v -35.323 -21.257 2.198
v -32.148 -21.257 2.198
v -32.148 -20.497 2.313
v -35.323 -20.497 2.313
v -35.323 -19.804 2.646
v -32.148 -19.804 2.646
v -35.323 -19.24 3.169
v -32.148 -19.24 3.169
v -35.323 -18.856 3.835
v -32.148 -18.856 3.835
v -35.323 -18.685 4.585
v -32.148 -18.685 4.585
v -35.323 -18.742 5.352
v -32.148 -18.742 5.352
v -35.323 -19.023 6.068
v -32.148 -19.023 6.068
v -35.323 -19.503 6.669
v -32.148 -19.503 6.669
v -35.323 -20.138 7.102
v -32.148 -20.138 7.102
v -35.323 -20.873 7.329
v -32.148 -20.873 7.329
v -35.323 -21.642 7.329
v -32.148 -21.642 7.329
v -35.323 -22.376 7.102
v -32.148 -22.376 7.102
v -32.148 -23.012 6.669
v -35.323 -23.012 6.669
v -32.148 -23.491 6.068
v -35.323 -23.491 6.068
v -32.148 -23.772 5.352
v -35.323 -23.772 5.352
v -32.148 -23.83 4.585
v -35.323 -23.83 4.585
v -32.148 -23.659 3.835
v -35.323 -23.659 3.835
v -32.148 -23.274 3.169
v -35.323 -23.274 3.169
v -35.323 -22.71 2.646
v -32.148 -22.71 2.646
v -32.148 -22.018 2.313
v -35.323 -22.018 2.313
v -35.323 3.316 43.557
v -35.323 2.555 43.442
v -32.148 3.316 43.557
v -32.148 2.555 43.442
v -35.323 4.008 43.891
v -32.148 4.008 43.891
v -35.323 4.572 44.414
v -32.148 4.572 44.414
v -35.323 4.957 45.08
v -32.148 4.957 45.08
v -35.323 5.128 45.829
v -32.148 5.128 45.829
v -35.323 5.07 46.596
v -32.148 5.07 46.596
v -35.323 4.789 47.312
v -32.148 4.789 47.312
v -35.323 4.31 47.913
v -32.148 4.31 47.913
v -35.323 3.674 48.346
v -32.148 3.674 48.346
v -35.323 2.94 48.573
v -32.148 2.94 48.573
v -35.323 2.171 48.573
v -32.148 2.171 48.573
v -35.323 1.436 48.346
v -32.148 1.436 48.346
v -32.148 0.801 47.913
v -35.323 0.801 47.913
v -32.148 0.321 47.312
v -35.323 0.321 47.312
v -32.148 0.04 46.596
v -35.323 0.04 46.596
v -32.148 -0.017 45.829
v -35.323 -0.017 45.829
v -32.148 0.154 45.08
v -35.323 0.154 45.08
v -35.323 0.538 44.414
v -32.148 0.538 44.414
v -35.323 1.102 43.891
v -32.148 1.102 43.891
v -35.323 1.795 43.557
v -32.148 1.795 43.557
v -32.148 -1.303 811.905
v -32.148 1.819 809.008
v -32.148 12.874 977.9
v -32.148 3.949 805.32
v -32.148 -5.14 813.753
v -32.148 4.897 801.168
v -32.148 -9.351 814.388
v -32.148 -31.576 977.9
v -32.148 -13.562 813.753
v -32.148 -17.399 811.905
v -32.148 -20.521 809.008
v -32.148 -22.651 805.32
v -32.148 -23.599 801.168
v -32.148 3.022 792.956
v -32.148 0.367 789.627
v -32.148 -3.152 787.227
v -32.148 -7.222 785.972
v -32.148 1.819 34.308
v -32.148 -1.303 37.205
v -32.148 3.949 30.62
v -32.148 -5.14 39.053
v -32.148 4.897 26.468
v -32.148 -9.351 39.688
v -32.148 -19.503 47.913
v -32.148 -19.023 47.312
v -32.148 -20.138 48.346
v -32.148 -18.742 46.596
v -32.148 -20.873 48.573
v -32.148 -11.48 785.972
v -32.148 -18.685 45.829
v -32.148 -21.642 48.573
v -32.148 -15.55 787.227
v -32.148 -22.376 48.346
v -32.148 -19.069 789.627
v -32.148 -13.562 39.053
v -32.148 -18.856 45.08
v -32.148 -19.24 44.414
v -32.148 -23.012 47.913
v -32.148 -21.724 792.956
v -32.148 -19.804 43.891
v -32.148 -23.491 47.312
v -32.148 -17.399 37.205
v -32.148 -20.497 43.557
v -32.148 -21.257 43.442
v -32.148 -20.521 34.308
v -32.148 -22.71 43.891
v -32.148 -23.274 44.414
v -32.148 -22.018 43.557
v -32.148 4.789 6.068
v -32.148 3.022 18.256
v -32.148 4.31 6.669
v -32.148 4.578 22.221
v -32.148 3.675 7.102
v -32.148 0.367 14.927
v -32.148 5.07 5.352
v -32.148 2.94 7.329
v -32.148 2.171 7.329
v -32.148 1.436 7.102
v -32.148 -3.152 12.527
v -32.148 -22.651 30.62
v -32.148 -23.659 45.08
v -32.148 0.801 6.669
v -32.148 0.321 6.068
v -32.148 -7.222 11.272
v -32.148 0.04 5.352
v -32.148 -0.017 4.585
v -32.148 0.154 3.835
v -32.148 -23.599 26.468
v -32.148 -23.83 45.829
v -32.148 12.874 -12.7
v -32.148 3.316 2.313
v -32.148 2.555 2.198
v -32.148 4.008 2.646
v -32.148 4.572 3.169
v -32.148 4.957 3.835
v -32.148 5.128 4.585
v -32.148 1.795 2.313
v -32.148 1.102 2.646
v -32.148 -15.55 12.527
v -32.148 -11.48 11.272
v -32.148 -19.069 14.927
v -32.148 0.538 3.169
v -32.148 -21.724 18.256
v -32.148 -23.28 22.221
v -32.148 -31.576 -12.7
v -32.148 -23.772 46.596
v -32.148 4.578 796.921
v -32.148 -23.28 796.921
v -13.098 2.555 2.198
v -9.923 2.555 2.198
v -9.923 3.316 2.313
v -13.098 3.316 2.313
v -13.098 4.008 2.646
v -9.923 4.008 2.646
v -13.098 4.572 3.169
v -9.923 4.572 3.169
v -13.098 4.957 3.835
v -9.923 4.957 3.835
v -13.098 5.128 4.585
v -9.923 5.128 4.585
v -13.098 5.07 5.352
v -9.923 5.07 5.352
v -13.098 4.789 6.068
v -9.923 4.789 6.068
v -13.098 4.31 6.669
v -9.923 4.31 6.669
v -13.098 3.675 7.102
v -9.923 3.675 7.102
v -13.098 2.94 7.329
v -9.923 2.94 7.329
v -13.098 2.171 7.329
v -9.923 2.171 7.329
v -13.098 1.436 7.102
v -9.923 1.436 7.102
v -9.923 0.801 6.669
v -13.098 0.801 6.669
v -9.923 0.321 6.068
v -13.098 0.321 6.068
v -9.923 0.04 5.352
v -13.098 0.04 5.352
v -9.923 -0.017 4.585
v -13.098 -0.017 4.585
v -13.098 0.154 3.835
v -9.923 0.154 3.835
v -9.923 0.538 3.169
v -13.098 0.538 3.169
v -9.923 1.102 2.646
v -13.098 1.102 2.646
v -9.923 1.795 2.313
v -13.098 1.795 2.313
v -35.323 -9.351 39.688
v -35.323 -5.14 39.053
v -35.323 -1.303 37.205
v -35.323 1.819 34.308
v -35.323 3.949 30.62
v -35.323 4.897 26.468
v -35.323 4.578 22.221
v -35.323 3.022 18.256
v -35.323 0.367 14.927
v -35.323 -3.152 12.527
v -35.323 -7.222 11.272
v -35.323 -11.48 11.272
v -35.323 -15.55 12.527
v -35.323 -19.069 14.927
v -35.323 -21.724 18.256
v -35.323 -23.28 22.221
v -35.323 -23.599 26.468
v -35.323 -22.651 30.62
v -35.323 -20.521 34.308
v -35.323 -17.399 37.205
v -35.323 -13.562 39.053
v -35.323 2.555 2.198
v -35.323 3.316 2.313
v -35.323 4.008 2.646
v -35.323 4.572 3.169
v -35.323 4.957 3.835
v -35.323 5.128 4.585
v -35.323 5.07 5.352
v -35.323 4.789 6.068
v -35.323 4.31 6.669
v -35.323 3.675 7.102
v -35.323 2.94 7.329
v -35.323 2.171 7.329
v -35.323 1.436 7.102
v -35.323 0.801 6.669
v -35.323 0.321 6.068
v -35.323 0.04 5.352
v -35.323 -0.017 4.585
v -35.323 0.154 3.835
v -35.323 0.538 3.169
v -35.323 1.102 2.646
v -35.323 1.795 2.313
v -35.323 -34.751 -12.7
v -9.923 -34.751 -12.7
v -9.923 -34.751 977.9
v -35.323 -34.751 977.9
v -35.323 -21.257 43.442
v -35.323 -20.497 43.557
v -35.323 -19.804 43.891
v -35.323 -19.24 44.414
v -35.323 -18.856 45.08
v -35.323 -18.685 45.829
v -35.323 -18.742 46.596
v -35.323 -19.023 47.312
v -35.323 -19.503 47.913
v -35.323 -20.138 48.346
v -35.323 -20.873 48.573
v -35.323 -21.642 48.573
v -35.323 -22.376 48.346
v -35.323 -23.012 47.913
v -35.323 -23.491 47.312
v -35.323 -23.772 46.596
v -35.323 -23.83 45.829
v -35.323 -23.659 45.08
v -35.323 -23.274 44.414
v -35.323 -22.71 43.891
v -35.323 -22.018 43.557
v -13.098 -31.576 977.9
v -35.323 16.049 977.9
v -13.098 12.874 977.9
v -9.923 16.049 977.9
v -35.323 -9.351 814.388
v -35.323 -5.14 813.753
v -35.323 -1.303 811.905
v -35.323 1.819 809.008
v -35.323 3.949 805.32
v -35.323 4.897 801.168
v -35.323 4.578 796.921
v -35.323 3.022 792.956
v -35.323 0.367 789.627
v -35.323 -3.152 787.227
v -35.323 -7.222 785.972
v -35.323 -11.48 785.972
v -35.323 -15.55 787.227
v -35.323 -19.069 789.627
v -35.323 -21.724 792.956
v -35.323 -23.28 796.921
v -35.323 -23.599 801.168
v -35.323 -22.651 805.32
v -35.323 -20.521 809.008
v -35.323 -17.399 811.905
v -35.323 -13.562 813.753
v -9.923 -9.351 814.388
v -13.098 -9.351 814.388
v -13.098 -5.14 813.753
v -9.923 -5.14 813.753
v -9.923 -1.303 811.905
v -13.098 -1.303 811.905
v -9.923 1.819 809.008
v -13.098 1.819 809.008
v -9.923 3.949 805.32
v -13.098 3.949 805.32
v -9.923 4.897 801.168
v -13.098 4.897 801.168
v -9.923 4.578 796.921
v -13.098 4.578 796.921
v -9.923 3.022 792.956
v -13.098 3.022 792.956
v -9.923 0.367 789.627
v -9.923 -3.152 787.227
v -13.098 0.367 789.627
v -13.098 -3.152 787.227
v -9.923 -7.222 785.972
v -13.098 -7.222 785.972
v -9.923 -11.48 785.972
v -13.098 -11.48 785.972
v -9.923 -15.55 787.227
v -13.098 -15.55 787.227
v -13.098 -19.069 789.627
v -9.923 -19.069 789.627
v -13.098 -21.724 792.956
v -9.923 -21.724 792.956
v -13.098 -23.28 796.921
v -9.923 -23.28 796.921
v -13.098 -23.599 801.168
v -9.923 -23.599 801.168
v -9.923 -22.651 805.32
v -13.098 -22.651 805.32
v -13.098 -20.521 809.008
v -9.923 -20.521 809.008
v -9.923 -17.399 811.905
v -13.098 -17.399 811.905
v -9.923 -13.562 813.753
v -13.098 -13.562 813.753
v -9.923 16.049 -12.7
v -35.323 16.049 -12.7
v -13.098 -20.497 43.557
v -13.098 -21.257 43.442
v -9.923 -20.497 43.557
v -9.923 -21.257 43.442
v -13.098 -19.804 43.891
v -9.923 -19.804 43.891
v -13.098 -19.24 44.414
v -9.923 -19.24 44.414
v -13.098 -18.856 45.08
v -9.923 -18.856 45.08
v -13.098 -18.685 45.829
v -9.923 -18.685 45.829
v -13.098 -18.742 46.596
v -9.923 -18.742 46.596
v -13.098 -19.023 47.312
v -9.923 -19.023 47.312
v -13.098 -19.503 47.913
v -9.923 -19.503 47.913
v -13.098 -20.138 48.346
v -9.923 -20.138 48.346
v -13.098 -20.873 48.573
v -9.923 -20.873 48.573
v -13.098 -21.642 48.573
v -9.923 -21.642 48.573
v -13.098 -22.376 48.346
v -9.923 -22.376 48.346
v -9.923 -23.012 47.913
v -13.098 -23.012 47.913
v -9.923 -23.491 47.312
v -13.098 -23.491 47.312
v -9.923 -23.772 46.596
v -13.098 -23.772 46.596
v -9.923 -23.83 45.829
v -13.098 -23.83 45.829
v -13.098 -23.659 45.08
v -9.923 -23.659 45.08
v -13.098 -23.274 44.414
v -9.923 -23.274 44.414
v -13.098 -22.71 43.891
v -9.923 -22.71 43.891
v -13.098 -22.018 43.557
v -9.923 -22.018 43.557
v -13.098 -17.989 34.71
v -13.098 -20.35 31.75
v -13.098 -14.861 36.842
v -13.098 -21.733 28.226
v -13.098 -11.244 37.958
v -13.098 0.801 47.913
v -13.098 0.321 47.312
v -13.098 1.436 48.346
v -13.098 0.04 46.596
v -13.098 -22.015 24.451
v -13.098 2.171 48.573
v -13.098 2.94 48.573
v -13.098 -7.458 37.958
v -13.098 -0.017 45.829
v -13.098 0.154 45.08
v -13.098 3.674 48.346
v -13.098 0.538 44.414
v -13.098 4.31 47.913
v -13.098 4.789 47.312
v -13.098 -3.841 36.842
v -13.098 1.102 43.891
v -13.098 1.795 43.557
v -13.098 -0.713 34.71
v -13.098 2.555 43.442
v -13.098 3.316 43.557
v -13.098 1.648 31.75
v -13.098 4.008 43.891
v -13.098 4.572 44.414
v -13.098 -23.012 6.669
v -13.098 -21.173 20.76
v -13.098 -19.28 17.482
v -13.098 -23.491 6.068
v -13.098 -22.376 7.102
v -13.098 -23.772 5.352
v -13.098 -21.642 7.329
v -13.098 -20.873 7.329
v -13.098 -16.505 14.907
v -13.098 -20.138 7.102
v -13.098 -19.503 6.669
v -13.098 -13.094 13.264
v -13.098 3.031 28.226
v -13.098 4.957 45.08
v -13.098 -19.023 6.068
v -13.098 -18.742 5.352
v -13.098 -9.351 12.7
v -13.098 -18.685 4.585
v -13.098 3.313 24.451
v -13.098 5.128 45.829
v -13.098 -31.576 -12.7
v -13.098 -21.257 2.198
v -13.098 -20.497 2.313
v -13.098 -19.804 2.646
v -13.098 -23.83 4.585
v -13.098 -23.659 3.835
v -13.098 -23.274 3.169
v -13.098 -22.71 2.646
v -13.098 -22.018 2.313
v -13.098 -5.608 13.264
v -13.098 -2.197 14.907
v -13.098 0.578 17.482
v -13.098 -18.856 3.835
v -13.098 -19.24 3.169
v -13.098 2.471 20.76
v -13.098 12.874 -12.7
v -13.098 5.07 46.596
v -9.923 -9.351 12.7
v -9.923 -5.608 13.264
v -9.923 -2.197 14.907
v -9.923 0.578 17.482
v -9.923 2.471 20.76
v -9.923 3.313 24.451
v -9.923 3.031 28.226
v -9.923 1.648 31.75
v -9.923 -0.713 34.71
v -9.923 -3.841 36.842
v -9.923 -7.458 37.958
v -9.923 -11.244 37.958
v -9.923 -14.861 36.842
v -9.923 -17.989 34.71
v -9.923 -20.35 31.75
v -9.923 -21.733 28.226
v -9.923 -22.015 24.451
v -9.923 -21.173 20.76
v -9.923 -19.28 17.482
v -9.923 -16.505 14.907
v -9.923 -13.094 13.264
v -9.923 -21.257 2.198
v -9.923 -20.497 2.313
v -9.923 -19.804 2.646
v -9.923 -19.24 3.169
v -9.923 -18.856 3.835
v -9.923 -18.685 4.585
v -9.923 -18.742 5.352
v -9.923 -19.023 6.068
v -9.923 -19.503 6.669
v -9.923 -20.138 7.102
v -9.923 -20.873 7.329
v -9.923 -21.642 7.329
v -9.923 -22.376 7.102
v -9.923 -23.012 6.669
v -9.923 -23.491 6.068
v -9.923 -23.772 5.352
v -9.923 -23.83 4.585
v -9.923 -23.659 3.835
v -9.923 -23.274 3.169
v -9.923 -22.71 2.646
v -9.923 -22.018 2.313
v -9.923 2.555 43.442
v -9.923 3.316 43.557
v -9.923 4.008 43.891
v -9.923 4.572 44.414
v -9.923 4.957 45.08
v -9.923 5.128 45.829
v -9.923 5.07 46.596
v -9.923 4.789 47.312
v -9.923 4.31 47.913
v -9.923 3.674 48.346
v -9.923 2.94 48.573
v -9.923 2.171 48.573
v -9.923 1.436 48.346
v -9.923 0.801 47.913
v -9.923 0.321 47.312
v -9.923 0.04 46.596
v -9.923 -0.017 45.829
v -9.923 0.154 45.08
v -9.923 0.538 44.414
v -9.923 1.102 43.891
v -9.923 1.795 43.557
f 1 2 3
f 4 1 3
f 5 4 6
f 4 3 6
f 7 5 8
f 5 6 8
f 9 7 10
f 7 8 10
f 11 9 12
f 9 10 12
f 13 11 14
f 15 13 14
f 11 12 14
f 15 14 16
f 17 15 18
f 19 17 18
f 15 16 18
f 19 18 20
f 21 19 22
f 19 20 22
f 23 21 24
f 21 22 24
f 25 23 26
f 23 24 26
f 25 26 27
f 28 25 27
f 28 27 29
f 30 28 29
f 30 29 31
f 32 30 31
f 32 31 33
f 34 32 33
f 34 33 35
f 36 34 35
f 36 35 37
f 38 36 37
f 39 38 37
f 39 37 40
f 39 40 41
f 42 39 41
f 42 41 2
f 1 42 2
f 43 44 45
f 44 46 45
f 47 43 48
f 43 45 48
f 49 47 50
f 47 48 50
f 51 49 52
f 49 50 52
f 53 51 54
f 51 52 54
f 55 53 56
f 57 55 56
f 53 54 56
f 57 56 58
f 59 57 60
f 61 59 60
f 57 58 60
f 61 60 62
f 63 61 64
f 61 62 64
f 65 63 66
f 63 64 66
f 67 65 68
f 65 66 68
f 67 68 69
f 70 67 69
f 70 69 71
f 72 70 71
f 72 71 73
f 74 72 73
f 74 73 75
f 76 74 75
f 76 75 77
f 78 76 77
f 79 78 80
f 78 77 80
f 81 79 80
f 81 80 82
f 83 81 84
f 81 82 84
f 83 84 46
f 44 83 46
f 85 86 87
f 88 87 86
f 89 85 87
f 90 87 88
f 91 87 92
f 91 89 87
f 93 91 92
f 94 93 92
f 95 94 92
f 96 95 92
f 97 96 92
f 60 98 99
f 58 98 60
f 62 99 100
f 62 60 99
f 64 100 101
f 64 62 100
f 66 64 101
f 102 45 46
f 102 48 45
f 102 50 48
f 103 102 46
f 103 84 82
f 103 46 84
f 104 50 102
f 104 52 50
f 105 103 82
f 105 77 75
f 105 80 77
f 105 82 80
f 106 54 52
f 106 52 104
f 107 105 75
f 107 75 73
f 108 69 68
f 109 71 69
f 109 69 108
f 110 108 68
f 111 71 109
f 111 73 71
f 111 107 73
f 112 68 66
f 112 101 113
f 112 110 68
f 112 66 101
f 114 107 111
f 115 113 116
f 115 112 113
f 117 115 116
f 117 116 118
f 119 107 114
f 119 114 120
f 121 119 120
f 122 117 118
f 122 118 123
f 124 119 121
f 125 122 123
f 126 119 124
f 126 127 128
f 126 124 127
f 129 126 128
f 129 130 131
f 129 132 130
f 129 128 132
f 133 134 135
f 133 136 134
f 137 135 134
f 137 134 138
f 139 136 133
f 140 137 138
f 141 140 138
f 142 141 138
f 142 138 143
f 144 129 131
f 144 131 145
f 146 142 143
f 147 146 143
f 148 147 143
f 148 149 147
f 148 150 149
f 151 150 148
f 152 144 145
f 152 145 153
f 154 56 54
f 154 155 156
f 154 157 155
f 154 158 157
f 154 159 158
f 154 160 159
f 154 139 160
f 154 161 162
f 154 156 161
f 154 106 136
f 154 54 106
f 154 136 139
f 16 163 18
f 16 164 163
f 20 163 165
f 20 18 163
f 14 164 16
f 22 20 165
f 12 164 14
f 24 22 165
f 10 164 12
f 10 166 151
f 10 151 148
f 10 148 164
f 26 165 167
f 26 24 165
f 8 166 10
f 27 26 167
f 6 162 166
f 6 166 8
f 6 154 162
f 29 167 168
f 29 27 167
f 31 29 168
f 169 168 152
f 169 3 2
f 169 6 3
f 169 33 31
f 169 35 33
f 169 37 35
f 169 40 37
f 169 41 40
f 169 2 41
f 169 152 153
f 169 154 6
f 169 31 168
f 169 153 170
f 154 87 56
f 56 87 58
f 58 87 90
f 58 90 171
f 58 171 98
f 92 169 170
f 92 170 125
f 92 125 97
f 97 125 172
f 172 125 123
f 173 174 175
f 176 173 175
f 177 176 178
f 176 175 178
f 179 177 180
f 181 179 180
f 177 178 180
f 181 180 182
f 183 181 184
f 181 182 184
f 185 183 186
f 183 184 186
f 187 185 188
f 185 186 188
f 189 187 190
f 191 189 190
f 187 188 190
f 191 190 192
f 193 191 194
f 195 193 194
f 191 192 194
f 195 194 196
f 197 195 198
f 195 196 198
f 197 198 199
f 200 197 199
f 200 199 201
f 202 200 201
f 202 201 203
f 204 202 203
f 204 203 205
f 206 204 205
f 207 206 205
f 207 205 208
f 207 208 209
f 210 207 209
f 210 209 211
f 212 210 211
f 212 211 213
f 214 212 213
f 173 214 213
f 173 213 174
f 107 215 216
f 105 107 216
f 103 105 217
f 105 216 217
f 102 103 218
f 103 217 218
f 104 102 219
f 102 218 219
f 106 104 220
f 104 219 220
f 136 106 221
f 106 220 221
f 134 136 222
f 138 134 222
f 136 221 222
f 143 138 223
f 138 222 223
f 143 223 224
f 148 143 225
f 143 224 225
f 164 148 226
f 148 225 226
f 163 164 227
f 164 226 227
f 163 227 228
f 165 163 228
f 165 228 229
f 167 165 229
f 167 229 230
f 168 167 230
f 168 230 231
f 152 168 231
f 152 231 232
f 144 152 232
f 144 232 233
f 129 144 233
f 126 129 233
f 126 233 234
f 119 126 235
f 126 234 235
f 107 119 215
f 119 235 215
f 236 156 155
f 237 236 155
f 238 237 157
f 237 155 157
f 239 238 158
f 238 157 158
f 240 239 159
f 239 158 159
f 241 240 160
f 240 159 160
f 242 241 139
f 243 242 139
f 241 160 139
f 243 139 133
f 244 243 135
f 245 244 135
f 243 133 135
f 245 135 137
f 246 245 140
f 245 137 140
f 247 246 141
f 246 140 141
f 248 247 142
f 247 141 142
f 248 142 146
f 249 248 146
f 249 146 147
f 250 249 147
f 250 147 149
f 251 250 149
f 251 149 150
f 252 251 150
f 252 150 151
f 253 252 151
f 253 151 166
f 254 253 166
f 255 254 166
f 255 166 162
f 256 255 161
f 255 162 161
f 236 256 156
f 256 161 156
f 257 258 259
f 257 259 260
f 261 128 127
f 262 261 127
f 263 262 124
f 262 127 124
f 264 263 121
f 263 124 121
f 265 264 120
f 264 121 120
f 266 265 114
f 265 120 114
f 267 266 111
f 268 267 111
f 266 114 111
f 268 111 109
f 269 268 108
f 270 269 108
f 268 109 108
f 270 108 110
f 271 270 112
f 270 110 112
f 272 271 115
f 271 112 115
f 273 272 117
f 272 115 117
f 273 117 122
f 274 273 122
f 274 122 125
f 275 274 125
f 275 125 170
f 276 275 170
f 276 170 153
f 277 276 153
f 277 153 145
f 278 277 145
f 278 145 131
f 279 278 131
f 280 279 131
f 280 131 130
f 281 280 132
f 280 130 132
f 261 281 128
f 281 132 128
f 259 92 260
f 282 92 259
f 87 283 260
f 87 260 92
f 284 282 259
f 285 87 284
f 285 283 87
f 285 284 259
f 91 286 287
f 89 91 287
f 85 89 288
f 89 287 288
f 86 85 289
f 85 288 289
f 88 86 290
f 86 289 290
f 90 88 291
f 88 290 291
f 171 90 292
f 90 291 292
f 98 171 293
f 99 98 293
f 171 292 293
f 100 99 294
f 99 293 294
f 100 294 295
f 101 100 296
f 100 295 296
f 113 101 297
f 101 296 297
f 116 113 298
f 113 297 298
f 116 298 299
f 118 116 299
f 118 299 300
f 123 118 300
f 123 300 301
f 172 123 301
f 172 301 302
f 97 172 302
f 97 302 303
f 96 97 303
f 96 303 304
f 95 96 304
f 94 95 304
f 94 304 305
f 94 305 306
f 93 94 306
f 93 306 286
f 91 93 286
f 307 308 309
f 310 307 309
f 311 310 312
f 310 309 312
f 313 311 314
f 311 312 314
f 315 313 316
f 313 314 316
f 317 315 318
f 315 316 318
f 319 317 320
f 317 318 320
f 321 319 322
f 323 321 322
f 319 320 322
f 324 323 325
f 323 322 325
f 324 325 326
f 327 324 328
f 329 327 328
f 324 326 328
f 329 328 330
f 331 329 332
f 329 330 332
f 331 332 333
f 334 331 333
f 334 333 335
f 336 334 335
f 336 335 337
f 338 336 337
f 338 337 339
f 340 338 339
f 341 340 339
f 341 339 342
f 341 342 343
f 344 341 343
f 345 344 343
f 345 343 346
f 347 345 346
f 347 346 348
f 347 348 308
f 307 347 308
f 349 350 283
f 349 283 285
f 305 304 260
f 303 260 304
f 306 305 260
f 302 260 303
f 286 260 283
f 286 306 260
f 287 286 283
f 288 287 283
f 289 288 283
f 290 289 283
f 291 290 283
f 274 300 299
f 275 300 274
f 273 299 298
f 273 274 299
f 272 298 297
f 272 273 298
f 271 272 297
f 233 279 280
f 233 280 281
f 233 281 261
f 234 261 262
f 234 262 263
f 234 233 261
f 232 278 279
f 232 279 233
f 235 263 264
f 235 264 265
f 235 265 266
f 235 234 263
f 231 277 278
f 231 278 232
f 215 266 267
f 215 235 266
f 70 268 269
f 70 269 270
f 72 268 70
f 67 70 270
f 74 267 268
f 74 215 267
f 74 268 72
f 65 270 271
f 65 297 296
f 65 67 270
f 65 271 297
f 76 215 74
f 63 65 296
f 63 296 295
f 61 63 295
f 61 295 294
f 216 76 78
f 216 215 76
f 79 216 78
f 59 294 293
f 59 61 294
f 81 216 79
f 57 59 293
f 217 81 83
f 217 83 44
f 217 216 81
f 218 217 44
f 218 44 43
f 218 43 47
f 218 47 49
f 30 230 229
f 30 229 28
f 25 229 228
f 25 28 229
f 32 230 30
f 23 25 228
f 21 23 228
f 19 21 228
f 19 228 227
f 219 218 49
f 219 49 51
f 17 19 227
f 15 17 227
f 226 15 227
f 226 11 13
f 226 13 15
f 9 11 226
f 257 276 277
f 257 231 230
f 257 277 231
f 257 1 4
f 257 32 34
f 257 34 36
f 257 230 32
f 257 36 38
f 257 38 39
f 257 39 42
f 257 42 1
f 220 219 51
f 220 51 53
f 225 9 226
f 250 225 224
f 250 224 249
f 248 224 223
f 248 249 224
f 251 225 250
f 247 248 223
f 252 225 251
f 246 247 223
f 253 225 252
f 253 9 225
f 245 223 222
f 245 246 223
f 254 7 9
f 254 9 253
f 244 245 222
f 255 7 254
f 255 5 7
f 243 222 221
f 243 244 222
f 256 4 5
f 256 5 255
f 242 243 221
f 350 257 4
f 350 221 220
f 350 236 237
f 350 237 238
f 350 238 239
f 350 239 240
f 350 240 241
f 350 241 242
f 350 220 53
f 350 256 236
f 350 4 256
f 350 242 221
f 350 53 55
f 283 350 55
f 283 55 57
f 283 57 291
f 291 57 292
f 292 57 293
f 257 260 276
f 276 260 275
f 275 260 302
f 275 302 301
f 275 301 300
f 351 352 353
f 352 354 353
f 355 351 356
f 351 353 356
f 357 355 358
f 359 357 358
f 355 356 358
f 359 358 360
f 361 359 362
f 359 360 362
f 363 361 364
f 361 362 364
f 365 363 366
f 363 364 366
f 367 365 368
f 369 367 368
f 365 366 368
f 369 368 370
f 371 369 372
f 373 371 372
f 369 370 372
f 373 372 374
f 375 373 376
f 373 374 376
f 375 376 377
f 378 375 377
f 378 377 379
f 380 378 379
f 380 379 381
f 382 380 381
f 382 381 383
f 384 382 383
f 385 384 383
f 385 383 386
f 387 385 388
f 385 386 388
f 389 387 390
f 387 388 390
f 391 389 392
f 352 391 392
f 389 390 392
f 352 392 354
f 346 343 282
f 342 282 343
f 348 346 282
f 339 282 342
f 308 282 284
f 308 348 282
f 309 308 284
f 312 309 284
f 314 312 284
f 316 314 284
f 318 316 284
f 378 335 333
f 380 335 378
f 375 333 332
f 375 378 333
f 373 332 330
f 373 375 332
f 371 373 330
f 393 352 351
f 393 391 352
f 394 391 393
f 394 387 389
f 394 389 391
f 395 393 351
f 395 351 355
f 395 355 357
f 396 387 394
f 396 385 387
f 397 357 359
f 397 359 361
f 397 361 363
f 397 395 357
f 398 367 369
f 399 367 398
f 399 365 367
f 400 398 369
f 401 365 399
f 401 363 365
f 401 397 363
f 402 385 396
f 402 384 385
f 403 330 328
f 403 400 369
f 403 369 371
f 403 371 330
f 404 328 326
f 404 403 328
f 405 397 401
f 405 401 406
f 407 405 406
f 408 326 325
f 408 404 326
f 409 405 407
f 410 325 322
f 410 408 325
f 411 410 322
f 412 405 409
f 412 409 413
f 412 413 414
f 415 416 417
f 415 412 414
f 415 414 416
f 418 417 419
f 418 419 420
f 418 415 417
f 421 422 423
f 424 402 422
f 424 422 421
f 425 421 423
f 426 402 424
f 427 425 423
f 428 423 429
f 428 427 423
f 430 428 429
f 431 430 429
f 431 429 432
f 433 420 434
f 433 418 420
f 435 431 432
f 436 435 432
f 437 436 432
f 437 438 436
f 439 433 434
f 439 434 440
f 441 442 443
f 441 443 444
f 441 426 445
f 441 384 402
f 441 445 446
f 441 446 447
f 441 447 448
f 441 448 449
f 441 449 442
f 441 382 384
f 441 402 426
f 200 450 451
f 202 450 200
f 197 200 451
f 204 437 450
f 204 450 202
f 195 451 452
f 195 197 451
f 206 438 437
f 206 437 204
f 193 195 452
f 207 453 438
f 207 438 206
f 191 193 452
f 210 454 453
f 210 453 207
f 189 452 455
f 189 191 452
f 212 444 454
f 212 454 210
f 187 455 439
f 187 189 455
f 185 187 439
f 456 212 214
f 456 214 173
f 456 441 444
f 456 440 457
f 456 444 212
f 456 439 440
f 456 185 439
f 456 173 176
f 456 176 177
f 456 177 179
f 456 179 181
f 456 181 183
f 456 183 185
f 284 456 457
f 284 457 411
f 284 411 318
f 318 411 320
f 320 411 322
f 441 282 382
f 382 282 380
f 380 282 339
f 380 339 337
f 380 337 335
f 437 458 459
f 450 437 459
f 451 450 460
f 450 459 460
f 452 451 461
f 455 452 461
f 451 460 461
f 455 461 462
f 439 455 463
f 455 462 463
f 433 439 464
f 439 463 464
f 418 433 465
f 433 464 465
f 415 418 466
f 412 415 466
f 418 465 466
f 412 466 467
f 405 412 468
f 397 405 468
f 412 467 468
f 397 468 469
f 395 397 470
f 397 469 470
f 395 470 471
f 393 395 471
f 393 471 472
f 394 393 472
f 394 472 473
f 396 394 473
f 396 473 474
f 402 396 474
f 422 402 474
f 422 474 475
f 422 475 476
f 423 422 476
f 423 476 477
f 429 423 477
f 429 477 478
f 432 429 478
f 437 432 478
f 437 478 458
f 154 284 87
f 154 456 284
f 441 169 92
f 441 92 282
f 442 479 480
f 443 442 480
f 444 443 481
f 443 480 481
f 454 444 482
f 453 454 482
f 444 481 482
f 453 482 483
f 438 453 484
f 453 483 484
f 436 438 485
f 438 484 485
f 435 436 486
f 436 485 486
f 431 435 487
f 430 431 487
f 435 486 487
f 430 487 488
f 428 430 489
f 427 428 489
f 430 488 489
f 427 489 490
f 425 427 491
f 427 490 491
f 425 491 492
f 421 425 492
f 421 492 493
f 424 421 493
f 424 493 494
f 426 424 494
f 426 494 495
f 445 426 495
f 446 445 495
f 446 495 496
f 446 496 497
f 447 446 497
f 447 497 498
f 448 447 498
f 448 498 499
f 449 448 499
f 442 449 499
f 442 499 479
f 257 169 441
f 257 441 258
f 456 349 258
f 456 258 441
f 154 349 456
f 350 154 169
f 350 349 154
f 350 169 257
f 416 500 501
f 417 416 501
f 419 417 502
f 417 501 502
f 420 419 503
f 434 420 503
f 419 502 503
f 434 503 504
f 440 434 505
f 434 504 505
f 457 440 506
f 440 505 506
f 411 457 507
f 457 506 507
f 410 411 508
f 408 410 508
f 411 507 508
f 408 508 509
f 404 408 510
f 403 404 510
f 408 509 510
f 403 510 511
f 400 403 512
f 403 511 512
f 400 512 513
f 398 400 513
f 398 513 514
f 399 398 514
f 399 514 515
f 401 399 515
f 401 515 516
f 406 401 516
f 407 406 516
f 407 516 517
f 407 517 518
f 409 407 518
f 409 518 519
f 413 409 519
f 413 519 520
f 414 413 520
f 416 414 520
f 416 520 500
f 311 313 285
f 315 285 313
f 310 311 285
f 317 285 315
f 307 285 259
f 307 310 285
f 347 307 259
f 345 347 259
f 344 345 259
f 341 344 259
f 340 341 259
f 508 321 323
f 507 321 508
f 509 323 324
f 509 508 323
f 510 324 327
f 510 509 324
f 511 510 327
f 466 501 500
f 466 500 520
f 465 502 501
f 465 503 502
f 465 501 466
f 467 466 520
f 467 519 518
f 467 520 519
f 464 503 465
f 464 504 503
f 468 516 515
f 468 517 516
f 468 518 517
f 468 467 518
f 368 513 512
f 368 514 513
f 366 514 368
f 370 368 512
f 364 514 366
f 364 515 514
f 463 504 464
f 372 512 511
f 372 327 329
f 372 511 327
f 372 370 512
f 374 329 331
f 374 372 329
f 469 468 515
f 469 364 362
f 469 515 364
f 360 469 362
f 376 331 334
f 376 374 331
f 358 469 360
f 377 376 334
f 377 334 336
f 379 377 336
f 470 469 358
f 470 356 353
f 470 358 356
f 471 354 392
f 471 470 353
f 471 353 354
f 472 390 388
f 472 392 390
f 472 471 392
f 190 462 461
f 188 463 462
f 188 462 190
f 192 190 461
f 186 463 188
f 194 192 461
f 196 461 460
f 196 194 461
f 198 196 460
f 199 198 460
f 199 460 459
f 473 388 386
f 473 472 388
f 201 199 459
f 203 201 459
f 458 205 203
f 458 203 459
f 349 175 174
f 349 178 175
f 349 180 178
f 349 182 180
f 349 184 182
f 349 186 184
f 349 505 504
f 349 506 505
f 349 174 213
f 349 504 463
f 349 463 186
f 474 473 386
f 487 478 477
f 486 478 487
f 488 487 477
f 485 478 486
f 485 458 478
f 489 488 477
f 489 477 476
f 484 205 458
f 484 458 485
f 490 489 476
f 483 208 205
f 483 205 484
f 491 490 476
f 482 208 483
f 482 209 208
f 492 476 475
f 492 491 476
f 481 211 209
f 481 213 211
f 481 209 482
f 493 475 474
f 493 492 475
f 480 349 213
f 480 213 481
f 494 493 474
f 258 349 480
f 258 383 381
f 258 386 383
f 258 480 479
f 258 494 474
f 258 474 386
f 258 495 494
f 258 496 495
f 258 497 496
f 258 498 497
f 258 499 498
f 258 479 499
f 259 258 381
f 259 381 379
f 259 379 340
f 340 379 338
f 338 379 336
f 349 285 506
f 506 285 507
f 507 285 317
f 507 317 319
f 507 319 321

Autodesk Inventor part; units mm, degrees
ref_plane "YZ Plane" through (0, 0, 0) normal (1, 0, 0) x (0, 1, 0)
ref_plane "XZ Plane" through (0, 0, 0) normal (0, 1, 0) x (-1, 0, 0)
ref_plane "XY Plane" through (0, 0, 0) normal (0, 0, 1) x (1, 0, 0)
sketch "Sketch1" plane through (0, 0, 0) normal (0, 0, 1) x (1, 0, 0)
  line L0 (-35.3228, 16.049) -> (-9.9228, 16.049)
  line L1 (-9.9228, 16.049) -> (-9.9228, -34.751)
  line L2 (-9.9228, -34.751) -> (-35.3228, -34.751)
  line L3 (-35.3228, -34.751) -> (-35.3228, 16.049)
  line L4 (-13.0978, 12.874) -> (-32.1478, 12.874)
  line L5 (-32.1478, 12.874) -> (-32.1478, -31.576)
  line L6 (-32.1478, -31.576) -> (-13.0978, -31.576)
  line L7 (-13.0978, -31.576) -> (-13.0978, 12.874)
  point P0 (0, 0)
  dimension "d0" = 25.4
  dimension "d1" = 50.8
  dimension "d2" = 3.175
extrude "Extrusion1" add sketch "Sketch1" along normal blind 977.9
sketch "Sketch2" plane through (-35.3228, -34.751, 0) normal (-1, 0, 0) x (0, 0, 1)
  line L0 (0, 0) -> (0, 50.8) construction
  line L1 (0, 25.4) -> (25.4, 25.4) construction
  circle A0 centre (25.4, 25.4) radius 14.2875
  point P0 (0, 34.751)
  dimension "d5" = 25.4
  dimension "d9" = 28.575
extrude "Extrusion2" cut sketch "Sketch2" against normal blind 12.7
sketch "Sketch3" plane through (-35.3228, -34.751, 0) normal (-1, 0, 0) x (0, 0, 1)
  line L0 (977.9, 50.8) -> (977.9, 0) construction
  line L1 (977.9, 25.4) -> (800.1, 25.4) construction
  circle A0 centre (800.1, 25.4) radius 14.2875
  point P0 (0, 34.751)
  dimension "d10" = 177.8
  dimension "d11" = 28.575
extrude "Extrusion3" cut sketch "Sketch3" against normal blind 25.4
sketch "Sketch7" plane through (-9.9228, -34.751, 0) normal (1, 0, 0) x (0, 0, -1)
  line L0 (0, 0) -> (0, 50.8) construction
  line L1 (0, 25.4) -> (-25.4, 25.4) construction
  circle A0 centre (-25.4, 25.4) radius 12.7
  point P0 (0, 34.751)
  dimension "d34" = 25.4
  dimension "d35" = 25.4
extrude "Extrusion7" cut sketch "Sketch7" against normal blind 12.7
sketch "Sketch9" plane through (-9.9228, -34.751, 0) normal (1, 0, 0) x (0, 0, -1)
  circle A0 centre (-25.4, 25.4) radius 12.7 construction
  line L0 (-25.4, 25.4) -> (-25.4, 49.2125) construction
  line L1 (-25.4, 49.2125) -> (-4.7778, 37.3063) construction
  line L2 (-4.7778, 37.3063) -> (-4.7778, 13.4938) construction
  line L3 (-4.7778, 13.4938) -> (-25.4, 1.5875) construction
  line L4 (-25.4, 1.5875) -> (-46.0222, 13.4937) construction
  line L5 (-46.0222, 13.4937) -> (-46.0222, 37.3062) construction
  line L6 (-46.0222, 37.3062) -> (-25.4, 49.2125) construction
  circle A1 centre (-4.7778, 37.3063) radius 2.5797
  circle A2 centre (-4.7778, 13.4938) radius 2.5797
  circle A3 centre (-46.0222, 13.4938) radius 2.5797
  circle A4 centre (-46.0222, 37.3062) radius 2.5797
  point P0 (0, 34.751)
  dimension "d44" = 23.8125
  dimension "d45" = 5.1594
  dimension "d46" = 5.1594
  dimension "d47" = 5.1594
  dimension "d48" = 5.1594
extrude "Extrusion9" cut sketch "Sketch9" against normal blind 25.4
sketch "Sketch10" plane through (0, 0, 0) normal (0, 0, -1) x (-1, 0, 0)
  line L0 (35.3228, 16.049) -> (9.9228, 16.049) projected
  line L1 (9.9228, 16.049) -> (13.0978, 16.049)
  line L2 (13.0978, 16.049) -> (13.0978, -34.751)
  line L3 (13.0978, -34.751) -> (9.9228, -34.751)
  line L4 (9.9228, -34.751) -> (9.9228, 16.049)
  line L5 (9.9228, -34.751) -> (35.3228, -34.751) projected
  line L6 (9.9228, -34.751) -> (35.3228, -34.751)
  line L7 (35.3228, -34.751) -> (35.3228, -31.576)
  line L8 (35.3228, -31.576) -> (9.9228, -31.576)
  line L9 (9.9228, -31.576) -> (9.9228, -34.751)
  line L10 (35.3228, -34.751) -> (32.1478, -34.751)
  line L11 (32.1478, -34.751) -> (32.1478, 16.049)
  line L12 (32.1478, 16.049) -> (35.3228, 16.049)
  line L13 (35.3228, 16.049) -> (35.3228, -34.751)
  line L14 (9.9228, 16.049) -> (35.3228, 16.049)
  line L15 (35.3228, 16.049) -> (35.3228, 12.874)
  line L16 (35.3228, 12.874) -> (9.9228, 12.874)
  line L17 (9.9228, 12.874) -> (9.9228, 16.049)
  point P0 (0, 0)
  dimension "d51" = 3.175
  dimension "d52" = 50.8
  dimension "d53" = 25.4
  dimension "d54" = 3.175
  dimension "d55" = 3.175
  dimension "d56" = 50.8
  dimension "d57" = 25.4
  dimension "d58" = 3.175
extrude "Extrusion10" add sketch "Sketch10" along normal blind 12.7 contours L13 L16 L11 L0 | L11 L16 L2 L0 | L13 L8 L11 L16 | L2 L16 L4 L0 | L7 L5 L11 L8 | L2 L8 L4 L16 | L11 L5 L2 L8 | L2 L3 L4 L8
properties part number "41.75in Arm Beam Alternate (Left)"
